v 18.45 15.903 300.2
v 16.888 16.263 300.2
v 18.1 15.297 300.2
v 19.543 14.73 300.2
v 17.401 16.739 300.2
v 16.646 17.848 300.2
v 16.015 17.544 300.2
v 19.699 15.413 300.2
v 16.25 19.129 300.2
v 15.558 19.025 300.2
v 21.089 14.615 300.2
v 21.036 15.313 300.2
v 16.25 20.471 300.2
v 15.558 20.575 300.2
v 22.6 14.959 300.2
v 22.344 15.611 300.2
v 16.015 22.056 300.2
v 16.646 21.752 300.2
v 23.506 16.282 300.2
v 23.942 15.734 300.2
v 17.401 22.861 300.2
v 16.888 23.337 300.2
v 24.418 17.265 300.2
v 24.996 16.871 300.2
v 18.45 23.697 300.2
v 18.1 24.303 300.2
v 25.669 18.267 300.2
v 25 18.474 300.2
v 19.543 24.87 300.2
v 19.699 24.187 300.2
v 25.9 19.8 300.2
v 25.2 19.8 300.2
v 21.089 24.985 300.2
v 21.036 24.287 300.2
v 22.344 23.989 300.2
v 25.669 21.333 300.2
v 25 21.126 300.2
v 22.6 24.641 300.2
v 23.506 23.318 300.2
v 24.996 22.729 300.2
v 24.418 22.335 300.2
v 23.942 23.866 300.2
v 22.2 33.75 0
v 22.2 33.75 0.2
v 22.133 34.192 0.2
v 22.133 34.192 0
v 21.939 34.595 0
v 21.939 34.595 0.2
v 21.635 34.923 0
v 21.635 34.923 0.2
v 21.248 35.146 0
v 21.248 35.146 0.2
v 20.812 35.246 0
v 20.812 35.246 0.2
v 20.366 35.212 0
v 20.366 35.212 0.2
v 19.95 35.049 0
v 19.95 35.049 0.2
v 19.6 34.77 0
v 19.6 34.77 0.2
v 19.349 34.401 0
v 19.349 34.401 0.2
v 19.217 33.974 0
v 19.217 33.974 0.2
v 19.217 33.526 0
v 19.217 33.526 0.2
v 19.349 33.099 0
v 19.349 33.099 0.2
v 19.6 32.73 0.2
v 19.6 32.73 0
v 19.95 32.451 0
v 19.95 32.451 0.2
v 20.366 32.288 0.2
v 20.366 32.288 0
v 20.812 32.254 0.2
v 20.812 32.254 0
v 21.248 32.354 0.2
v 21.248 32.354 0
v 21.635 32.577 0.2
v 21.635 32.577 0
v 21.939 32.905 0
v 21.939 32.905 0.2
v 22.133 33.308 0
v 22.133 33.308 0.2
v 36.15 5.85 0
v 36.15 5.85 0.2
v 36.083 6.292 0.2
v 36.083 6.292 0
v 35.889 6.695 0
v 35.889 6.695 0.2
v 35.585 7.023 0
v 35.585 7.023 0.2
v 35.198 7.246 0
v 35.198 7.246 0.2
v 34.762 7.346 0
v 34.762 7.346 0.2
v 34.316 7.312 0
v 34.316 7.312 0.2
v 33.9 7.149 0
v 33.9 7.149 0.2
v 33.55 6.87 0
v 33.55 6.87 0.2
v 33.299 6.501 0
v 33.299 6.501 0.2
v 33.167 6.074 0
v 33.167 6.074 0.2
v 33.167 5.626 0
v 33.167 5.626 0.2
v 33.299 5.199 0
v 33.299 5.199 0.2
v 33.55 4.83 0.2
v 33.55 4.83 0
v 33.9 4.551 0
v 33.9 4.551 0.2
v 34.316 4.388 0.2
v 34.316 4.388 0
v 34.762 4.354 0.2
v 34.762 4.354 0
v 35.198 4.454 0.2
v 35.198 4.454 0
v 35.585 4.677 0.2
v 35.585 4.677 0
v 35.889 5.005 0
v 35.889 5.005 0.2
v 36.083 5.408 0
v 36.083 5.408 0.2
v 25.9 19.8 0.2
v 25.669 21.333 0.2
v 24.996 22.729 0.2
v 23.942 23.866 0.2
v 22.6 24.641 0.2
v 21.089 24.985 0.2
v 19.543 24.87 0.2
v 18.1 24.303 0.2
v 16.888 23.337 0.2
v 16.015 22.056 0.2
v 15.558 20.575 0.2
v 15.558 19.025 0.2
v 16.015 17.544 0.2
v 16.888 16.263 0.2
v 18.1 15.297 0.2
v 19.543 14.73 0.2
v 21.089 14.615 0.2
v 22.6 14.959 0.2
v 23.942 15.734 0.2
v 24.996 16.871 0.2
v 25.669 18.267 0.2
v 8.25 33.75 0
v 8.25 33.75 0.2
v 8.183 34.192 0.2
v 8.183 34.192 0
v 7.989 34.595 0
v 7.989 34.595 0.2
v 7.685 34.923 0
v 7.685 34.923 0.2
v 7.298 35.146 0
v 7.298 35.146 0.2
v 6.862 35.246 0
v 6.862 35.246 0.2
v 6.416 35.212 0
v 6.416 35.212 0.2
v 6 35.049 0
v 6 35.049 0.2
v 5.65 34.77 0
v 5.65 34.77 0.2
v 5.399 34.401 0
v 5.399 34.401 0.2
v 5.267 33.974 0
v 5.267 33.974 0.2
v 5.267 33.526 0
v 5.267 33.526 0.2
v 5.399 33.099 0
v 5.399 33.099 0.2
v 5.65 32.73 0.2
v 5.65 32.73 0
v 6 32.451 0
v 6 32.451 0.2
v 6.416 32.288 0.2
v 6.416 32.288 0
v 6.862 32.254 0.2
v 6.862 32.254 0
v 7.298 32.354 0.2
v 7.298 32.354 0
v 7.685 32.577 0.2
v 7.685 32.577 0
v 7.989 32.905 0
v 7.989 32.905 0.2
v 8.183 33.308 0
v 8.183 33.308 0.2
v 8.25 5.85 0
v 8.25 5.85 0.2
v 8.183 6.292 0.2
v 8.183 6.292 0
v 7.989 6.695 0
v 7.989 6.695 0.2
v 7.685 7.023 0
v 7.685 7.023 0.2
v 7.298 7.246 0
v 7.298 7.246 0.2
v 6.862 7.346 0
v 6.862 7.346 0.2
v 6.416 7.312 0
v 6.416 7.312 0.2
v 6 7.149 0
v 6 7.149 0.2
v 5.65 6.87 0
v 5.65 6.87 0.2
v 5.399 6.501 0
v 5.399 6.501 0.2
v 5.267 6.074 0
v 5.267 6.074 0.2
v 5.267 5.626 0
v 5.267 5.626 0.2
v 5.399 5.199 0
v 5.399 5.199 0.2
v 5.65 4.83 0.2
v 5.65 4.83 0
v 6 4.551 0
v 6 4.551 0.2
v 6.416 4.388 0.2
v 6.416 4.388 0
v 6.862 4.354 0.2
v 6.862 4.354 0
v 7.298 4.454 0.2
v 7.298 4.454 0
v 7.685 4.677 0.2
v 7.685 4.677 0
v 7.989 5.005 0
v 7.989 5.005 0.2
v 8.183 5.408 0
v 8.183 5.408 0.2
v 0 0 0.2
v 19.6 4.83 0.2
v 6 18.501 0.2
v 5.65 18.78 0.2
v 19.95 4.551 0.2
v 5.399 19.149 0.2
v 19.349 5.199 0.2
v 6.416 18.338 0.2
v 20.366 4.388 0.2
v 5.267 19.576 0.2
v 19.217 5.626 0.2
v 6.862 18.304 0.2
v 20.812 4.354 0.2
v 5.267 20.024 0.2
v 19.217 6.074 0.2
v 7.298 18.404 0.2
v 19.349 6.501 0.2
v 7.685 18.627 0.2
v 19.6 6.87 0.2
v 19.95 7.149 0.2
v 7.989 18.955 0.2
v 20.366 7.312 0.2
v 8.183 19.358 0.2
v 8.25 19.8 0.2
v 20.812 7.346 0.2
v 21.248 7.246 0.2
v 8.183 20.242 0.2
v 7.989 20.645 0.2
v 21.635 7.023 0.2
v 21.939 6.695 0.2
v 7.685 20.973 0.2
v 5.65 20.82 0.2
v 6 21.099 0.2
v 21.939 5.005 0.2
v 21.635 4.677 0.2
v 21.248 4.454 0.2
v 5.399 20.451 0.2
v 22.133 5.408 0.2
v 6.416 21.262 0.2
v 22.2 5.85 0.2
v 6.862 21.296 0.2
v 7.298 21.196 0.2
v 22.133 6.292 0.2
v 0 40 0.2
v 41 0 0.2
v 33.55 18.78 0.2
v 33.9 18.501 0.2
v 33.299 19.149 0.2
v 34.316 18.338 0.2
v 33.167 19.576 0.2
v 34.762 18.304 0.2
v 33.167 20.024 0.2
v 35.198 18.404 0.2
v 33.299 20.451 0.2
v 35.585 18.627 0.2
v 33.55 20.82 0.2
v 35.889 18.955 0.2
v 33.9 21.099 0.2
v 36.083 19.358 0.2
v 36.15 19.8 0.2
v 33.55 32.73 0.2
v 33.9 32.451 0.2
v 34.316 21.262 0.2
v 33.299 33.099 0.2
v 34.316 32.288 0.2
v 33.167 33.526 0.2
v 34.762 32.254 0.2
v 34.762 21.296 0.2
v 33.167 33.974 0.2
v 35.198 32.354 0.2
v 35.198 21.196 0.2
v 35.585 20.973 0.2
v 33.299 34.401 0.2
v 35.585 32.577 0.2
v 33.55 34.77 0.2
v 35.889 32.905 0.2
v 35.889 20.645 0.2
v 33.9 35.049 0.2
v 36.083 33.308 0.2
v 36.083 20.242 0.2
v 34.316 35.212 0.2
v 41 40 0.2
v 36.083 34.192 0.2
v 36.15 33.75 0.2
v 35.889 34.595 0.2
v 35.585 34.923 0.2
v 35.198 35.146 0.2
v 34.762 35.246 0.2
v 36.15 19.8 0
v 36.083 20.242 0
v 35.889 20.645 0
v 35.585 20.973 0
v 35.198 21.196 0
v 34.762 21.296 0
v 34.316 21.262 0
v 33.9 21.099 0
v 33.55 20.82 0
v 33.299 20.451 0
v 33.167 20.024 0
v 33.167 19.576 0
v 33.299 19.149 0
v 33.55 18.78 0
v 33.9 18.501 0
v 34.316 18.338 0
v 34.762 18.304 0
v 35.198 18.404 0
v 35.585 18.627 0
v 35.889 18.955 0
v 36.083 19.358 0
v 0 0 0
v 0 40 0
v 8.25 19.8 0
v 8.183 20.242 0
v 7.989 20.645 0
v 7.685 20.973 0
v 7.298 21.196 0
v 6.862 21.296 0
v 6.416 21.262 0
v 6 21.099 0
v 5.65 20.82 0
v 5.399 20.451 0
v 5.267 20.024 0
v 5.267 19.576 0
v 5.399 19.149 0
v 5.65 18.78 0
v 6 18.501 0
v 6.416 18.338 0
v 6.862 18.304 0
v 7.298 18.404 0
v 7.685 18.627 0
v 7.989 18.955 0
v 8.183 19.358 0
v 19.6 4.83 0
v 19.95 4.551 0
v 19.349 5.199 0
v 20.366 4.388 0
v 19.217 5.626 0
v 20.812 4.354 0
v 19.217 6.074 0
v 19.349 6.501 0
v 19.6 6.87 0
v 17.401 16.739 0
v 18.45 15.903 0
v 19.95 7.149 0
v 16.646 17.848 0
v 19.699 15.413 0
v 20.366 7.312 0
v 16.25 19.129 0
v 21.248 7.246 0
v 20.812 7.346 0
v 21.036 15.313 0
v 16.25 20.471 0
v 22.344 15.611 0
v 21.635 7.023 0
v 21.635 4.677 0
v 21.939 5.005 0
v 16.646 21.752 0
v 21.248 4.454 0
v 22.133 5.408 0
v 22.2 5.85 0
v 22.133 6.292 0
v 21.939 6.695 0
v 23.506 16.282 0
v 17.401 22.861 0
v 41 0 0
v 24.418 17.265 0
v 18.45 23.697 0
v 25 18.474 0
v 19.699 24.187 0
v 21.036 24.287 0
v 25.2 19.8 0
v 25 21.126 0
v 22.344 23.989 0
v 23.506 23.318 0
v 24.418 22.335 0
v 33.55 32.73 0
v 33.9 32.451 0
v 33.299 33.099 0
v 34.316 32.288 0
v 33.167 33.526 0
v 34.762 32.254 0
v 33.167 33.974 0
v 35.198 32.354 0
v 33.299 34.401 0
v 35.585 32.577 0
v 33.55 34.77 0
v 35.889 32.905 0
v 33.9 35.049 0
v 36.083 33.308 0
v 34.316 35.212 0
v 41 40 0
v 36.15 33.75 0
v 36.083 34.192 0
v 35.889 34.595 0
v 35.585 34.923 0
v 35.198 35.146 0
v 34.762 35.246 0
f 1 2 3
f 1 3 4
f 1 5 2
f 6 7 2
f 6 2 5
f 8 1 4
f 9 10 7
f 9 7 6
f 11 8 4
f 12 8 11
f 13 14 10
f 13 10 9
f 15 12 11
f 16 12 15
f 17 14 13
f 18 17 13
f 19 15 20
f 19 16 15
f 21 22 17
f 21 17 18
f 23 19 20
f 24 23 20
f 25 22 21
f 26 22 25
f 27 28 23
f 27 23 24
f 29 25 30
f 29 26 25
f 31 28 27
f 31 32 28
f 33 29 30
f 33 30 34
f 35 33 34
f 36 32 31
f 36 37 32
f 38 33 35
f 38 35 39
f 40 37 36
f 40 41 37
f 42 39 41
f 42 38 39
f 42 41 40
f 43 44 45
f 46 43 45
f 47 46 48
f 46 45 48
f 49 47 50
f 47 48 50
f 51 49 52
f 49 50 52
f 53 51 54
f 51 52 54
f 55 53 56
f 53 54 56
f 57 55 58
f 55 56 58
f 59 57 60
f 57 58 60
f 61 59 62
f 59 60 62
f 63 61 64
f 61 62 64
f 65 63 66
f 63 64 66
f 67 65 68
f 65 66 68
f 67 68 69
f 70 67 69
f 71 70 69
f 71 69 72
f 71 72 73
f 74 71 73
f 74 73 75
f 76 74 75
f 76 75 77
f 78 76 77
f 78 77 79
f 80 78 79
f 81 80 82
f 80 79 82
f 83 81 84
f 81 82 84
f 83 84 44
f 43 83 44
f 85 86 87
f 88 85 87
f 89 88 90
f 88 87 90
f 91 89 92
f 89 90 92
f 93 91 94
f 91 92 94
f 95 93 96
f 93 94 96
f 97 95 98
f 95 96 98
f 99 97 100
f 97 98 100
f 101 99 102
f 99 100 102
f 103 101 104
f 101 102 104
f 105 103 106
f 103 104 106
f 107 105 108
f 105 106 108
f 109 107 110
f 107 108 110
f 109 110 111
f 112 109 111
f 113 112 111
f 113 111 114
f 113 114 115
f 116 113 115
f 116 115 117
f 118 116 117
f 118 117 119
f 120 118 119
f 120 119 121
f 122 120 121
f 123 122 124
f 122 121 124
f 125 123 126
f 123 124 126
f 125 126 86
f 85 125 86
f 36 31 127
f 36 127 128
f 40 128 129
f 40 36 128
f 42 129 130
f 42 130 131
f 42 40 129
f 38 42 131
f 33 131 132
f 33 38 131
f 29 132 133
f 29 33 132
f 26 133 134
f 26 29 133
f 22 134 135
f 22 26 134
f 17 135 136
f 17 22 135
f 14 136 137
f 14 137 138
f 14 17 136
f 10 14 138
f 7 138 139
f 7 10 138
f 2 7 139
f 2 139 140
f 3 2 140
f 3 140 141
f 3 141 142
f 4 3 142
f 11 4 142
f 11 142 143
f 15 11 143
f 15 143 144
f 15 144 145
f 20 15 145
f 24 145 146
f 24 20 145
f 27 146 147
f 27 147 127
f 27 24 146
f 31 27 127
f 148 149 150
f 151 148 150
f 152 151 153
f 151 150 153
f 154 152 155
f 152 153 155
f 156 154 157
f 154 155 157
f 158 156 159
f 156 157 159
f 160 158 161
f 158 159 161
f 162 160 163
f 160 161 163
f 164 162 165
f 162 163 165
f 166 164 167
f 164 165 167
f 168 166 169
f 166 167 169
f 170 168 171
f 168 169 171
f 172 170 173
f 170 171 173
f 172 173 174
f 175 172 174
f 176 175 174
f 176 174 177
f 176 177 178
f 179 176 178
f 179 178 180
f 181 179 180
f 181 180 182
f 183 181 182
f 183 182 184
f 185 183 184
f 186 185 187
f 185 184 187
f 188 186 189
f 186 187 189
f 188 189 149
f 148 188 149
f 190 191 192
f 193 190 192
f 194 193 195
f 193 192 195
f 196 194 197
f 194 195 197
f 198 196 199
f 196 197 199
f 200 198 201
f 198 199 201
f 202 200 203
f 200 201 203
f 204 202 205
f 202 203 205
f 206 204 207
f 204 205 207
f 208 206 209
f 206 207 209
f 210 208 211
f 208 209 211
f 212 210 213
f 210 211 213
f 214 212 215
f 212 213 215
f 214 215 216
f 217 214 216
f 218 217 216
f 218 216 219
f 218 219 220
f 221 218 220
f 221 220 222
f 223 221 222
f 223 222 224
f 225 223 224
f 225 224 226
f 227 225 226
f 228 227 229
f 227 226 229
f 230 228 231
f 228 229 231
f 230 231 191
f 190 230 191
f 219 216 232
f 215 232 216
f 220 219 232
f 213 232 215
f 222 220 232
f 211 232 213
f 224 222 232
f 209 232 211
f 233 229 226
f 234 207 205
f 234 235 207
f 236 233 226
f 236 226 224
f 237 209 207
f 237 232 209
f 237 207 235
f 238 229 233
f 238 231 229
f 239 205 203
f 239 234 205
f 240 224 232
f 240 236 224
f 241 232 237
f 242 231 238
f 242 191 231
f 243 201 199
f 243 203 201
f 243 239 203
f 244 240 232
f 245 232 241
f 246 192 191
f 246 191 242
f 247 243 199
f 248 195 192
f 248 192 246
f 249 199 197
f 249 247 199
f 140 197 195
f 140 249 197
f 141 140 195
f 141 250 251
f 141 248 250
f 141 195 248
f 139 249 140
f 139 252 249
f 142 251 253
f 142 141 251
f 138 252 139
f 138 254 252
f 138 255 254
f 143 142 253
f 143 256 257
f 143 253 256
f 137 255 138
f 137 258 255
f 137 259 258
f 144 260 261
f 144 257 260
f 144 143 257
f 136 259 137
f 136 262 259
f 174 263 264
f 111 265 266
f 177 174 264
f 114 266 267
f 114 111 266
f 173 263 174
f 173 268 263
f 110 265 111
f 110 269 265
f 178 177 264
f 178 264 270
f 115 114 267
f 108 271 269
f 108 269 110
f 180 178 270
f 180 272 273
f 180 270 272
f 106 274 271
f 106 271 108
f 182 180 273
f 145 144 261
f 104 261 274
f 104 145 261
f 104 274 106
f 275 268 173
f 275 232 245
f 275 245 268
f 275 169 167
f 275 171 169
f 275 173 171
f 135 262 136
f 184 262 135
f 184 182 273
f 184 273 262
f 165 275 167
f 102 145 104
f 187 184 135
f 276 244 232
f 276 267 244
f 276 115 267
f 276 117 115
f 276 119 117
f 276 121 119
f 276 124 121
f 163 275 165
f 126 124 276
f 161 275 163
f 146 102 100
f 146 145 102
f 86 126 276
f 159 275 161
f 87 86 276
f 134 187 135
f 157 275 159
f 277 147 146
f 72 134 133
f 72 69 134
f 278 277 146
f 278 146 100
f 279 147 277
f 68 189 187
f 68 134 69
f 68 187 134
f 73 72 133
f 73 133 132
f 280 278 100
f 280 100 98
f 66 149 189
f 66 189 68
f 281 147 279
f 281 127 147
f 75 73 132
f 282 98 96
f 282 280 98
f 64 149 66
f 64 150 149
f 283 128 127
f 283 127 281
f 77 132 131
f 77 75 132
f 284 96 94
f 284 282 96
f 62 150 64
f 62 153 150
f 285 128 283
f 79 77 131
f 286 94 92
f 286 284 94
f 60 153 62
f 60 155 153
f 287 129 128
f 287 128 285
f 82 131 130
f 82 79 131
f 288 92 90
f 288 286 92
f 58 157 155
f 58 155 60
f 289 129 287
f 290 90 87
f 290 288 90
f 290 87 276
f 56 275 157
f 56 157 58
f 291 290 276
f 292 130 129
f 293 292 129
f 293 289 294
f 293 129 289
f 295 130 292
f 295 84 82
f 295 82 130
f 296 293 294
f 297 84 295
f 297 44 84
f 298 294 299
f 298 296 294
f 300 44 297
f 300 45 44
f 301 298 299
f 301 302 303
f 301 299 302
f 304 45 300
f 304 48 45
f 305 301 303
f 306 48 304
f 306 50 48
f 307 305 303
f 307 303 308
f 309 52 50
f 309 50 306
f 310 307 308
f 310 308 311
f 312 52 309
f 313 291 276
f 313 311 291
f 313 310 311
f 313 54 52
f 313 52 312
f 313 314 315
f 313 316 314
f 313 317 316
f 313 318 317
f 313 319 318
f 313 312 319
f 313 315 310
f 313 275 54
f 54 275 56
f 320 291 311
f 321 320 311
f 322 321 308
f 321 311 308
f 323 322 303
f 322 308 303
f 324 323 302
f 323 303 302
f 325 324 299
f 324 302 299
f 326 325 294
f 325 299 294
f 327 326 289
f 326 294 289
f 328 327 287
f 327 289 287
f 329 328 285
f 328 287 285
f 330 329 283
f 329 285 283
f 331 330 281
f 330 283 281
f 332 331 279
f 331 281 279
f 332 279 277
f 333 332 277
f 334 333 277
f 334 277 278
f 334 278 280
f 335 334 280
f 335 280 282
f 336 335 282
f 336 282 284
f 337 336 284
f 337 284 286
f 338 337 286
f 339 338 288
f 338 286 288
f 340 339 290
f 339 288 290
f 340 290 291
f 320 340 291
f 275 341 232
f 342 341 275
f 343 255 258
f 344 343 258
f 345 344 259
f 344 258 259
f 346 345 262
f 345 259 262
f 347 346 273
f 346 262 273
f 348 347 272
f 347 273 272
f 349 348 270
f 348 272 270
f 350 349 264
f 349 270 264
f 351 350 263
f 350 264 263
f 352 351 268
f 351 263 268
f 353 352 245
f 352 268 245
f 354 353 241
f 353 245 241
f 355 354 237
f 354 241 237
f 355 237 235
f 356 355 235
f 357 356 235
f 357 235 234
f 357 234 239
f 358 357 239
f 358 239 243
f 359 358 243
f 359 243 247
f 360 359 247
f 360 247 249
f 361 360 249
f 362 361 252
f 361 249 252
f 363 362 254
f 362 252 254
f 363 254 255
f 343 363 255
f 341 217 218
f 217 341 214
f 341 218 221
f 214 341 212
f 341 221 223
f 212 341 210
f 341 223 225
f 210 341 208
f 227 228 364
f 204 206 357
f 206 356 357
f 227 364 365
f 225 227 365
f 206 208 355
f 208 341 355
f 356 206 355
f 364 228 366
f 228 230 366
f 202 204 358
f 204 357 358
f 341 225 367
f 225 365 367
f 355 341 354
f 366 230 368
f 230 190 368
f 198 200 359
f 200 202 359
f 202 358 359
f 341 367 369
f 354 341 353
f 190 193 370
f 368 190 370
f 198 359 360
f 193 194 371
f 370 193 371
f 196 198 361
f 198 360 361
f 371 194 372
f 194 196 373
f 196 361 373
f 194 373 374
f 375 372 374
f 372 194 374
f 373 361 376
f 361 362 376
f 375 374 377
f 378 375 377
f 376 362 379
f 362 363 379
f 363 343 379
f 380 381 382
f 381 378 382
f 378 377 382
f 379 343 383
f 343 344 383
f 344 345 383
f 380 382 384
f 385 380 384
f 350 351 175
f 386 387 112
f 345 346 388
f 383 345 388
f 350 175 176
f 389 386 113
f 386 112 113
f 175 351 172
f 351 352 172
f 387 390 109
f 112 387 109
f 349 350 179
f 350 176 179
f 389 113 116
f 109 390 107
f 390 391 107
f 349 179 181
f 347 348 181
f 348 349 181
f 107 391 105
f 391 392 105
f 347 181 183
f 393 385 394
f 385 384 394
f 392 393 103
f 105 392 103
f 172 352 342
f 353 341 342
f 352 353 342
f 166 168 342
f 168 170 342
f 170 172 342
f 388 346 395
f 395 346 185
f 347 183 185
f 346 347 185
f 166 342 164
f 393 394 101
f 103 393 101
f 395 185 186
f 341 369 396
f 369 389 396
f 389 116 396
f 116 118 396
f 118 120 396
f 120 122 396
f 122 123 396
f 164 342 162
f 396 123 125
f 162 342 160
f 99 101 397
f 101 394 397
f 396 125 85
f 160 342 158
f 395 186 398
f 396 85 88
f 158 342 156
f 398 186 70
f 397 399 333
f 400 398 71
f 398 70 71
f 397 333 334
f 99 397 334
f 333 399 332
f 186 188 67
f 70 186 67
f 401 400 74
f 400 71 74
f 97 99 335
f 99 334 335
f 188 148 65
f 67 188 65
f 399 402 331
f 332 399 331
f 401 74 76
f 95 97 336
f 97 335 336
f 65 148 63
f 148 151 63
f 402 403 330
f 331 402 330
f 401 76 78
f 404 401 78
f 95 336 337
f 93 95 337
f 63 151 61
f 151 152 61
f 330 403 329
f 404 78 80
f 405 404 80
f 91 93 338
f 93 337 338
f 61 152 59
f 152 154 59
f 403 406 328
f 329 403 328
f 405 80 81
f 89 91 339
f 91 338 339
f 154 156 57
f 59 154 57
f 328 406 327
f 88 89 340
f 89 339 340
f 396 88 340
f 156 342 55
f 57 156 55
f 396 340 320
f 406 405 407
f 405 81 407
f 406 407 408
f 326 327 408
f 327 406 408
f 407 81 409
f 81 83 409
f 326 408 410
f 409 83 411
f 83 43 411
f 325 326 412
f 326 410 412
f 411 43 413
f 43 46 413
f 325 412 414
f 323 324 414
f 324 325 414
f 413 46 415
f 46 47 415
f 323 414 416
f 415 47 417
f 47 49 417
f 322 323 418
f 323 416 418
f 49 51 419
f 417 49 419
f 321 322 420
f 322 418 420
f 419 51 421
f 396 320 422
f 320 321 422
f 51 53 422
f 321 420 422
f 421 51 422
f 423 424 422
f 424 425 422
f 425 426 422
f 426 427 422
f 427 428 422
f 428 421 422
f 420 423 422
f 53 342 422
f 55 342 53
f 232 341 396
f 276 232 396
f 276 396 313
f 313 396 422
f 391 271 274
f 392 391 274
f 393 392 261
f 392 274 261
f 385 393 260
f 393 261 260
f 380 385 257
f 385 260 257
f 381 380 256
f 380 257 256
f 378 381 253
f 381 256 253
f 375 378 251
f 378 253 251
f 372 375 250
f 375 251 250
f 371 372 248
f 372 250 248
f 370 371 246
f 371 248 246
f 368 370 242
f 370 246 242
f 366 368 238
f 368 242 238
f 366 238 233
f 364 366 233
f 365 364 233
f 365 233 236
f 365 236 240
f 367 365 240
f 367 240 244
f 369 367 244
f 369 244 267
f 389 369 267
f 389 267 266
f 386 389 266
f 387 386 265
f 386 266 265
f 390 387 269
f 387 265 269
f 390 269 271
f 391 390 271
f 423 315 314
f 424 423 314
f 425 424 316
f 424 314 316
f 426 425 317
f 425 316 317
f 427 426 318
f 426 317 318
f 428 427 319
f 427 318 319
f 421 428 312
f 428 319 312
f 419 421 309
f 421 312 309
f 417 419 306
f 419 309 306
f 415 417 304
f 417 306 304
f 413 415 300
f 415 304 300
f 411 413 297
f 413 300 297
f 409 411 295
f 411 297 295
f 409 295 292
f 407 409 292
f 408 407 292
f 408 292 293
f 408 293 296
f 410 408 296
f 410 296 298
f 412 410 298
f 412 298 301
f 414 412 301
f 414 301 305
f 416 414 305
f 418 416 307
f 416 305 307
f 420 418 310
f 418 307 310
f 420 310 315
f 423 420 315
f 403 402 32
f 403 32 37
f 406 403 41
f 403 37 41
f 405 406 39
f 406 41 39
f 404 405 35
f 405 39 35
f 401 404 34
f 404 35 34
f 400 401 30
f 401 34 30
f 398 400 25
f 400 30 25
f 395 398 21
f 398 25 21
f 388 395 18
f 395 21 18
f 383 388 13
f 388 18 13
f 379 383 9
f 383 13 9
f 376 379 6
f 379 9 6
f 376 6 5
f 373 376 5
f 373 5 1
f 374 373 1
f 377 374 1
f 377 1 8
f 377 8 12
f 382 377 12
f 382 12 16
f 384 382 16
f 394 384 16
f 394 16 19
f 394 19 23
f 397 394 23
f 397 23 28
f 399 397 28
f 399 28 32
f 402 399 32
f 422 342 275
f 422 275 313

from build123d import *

# Parameters (mm, degrees)
SKETCH_1_W          = 41
SKETCH_1_H          = 40
EXTRUDE_1_DEPTH     = 0.2
SKETCH_5_R          = 4.5
CUT_EXTRUDE_3_DEPTH = 0.2
SKETCH_6_R          = 1.5
CUT_EXTRUDE_4_DEPTH = 0.2
EXTRUDE_START       = 300
SKETCH_7_R          = 5.2
SKETCH_7_R_2        = 4.5
EXTRUDE_2_DEPTH     = 300


with BuildPart() as part:
    # 스케치1 → 보스-돌출1 (new body)
    with BuildSketch(Plane.XY):
        with Locations((20.5, 20)):
            Rectangle(SKETCH_1_W, SKETCH_1_H)
    extrude(amount=EXTRUDE_1_DEPTH)

    # 스케치5 → 컷-돌출3 (cut)
    with BuildSketch(Plane.XY.offset(0.2)):
        with Locations((20.7, 19.8)):
            Circle(SKETCH_5_R)
    extrude(amount=-CUT_EXTRUDE_3_DEPTH, mode=Mode.SUBTRACT)

    # 스케치6 → 컷-돌출4 (cut)
    with BuildSketch(Plane.XY.offset(0.2)):
        with Locations((20.7, 33.75)):
            Circle(SKETCH_6_R)
        with Locations((34.65, 33.75)):
            Circle(SKETCH_6_R)
        with Locations((34.65, 19.8)):
            Circle(SKETCH_6_R)
        with Locations((20.7, 5.85)):
            Circle(SKETCH_6_R)
        with Locations((34.65, 5.85)):
            Circle(SKETCH_6_R)
        with Locations((6.75, 5.85)):
            Circle(SKETCH_6_R)
        with Locations((6.75, 33.75)):
            Circle(SKETCH_6_R)
        with Locations((6.75, 19.8)):
            Circle(SKETCH_6_R)
    extrude(amount=-CUT_EXTRUDE_4_DEPTH, mode=Mode.SUBTRACT)

    # 스케치7 → 보스-돌출2 (add)
    with BuildSketch(Plane.XY.offset(0.2).offset(EXTRUDE_START)):
        with Locations((20.7, 19.8)):
            Circle(SKETCH_7_R)
        with Locations((20.7, 19.8)):
            Circle(SKETCH_7_R_2, mode=Mode.SUBTRACT)
    extrude(amount=-EXTRUDE_2_DEPTH)


solid = part.part
